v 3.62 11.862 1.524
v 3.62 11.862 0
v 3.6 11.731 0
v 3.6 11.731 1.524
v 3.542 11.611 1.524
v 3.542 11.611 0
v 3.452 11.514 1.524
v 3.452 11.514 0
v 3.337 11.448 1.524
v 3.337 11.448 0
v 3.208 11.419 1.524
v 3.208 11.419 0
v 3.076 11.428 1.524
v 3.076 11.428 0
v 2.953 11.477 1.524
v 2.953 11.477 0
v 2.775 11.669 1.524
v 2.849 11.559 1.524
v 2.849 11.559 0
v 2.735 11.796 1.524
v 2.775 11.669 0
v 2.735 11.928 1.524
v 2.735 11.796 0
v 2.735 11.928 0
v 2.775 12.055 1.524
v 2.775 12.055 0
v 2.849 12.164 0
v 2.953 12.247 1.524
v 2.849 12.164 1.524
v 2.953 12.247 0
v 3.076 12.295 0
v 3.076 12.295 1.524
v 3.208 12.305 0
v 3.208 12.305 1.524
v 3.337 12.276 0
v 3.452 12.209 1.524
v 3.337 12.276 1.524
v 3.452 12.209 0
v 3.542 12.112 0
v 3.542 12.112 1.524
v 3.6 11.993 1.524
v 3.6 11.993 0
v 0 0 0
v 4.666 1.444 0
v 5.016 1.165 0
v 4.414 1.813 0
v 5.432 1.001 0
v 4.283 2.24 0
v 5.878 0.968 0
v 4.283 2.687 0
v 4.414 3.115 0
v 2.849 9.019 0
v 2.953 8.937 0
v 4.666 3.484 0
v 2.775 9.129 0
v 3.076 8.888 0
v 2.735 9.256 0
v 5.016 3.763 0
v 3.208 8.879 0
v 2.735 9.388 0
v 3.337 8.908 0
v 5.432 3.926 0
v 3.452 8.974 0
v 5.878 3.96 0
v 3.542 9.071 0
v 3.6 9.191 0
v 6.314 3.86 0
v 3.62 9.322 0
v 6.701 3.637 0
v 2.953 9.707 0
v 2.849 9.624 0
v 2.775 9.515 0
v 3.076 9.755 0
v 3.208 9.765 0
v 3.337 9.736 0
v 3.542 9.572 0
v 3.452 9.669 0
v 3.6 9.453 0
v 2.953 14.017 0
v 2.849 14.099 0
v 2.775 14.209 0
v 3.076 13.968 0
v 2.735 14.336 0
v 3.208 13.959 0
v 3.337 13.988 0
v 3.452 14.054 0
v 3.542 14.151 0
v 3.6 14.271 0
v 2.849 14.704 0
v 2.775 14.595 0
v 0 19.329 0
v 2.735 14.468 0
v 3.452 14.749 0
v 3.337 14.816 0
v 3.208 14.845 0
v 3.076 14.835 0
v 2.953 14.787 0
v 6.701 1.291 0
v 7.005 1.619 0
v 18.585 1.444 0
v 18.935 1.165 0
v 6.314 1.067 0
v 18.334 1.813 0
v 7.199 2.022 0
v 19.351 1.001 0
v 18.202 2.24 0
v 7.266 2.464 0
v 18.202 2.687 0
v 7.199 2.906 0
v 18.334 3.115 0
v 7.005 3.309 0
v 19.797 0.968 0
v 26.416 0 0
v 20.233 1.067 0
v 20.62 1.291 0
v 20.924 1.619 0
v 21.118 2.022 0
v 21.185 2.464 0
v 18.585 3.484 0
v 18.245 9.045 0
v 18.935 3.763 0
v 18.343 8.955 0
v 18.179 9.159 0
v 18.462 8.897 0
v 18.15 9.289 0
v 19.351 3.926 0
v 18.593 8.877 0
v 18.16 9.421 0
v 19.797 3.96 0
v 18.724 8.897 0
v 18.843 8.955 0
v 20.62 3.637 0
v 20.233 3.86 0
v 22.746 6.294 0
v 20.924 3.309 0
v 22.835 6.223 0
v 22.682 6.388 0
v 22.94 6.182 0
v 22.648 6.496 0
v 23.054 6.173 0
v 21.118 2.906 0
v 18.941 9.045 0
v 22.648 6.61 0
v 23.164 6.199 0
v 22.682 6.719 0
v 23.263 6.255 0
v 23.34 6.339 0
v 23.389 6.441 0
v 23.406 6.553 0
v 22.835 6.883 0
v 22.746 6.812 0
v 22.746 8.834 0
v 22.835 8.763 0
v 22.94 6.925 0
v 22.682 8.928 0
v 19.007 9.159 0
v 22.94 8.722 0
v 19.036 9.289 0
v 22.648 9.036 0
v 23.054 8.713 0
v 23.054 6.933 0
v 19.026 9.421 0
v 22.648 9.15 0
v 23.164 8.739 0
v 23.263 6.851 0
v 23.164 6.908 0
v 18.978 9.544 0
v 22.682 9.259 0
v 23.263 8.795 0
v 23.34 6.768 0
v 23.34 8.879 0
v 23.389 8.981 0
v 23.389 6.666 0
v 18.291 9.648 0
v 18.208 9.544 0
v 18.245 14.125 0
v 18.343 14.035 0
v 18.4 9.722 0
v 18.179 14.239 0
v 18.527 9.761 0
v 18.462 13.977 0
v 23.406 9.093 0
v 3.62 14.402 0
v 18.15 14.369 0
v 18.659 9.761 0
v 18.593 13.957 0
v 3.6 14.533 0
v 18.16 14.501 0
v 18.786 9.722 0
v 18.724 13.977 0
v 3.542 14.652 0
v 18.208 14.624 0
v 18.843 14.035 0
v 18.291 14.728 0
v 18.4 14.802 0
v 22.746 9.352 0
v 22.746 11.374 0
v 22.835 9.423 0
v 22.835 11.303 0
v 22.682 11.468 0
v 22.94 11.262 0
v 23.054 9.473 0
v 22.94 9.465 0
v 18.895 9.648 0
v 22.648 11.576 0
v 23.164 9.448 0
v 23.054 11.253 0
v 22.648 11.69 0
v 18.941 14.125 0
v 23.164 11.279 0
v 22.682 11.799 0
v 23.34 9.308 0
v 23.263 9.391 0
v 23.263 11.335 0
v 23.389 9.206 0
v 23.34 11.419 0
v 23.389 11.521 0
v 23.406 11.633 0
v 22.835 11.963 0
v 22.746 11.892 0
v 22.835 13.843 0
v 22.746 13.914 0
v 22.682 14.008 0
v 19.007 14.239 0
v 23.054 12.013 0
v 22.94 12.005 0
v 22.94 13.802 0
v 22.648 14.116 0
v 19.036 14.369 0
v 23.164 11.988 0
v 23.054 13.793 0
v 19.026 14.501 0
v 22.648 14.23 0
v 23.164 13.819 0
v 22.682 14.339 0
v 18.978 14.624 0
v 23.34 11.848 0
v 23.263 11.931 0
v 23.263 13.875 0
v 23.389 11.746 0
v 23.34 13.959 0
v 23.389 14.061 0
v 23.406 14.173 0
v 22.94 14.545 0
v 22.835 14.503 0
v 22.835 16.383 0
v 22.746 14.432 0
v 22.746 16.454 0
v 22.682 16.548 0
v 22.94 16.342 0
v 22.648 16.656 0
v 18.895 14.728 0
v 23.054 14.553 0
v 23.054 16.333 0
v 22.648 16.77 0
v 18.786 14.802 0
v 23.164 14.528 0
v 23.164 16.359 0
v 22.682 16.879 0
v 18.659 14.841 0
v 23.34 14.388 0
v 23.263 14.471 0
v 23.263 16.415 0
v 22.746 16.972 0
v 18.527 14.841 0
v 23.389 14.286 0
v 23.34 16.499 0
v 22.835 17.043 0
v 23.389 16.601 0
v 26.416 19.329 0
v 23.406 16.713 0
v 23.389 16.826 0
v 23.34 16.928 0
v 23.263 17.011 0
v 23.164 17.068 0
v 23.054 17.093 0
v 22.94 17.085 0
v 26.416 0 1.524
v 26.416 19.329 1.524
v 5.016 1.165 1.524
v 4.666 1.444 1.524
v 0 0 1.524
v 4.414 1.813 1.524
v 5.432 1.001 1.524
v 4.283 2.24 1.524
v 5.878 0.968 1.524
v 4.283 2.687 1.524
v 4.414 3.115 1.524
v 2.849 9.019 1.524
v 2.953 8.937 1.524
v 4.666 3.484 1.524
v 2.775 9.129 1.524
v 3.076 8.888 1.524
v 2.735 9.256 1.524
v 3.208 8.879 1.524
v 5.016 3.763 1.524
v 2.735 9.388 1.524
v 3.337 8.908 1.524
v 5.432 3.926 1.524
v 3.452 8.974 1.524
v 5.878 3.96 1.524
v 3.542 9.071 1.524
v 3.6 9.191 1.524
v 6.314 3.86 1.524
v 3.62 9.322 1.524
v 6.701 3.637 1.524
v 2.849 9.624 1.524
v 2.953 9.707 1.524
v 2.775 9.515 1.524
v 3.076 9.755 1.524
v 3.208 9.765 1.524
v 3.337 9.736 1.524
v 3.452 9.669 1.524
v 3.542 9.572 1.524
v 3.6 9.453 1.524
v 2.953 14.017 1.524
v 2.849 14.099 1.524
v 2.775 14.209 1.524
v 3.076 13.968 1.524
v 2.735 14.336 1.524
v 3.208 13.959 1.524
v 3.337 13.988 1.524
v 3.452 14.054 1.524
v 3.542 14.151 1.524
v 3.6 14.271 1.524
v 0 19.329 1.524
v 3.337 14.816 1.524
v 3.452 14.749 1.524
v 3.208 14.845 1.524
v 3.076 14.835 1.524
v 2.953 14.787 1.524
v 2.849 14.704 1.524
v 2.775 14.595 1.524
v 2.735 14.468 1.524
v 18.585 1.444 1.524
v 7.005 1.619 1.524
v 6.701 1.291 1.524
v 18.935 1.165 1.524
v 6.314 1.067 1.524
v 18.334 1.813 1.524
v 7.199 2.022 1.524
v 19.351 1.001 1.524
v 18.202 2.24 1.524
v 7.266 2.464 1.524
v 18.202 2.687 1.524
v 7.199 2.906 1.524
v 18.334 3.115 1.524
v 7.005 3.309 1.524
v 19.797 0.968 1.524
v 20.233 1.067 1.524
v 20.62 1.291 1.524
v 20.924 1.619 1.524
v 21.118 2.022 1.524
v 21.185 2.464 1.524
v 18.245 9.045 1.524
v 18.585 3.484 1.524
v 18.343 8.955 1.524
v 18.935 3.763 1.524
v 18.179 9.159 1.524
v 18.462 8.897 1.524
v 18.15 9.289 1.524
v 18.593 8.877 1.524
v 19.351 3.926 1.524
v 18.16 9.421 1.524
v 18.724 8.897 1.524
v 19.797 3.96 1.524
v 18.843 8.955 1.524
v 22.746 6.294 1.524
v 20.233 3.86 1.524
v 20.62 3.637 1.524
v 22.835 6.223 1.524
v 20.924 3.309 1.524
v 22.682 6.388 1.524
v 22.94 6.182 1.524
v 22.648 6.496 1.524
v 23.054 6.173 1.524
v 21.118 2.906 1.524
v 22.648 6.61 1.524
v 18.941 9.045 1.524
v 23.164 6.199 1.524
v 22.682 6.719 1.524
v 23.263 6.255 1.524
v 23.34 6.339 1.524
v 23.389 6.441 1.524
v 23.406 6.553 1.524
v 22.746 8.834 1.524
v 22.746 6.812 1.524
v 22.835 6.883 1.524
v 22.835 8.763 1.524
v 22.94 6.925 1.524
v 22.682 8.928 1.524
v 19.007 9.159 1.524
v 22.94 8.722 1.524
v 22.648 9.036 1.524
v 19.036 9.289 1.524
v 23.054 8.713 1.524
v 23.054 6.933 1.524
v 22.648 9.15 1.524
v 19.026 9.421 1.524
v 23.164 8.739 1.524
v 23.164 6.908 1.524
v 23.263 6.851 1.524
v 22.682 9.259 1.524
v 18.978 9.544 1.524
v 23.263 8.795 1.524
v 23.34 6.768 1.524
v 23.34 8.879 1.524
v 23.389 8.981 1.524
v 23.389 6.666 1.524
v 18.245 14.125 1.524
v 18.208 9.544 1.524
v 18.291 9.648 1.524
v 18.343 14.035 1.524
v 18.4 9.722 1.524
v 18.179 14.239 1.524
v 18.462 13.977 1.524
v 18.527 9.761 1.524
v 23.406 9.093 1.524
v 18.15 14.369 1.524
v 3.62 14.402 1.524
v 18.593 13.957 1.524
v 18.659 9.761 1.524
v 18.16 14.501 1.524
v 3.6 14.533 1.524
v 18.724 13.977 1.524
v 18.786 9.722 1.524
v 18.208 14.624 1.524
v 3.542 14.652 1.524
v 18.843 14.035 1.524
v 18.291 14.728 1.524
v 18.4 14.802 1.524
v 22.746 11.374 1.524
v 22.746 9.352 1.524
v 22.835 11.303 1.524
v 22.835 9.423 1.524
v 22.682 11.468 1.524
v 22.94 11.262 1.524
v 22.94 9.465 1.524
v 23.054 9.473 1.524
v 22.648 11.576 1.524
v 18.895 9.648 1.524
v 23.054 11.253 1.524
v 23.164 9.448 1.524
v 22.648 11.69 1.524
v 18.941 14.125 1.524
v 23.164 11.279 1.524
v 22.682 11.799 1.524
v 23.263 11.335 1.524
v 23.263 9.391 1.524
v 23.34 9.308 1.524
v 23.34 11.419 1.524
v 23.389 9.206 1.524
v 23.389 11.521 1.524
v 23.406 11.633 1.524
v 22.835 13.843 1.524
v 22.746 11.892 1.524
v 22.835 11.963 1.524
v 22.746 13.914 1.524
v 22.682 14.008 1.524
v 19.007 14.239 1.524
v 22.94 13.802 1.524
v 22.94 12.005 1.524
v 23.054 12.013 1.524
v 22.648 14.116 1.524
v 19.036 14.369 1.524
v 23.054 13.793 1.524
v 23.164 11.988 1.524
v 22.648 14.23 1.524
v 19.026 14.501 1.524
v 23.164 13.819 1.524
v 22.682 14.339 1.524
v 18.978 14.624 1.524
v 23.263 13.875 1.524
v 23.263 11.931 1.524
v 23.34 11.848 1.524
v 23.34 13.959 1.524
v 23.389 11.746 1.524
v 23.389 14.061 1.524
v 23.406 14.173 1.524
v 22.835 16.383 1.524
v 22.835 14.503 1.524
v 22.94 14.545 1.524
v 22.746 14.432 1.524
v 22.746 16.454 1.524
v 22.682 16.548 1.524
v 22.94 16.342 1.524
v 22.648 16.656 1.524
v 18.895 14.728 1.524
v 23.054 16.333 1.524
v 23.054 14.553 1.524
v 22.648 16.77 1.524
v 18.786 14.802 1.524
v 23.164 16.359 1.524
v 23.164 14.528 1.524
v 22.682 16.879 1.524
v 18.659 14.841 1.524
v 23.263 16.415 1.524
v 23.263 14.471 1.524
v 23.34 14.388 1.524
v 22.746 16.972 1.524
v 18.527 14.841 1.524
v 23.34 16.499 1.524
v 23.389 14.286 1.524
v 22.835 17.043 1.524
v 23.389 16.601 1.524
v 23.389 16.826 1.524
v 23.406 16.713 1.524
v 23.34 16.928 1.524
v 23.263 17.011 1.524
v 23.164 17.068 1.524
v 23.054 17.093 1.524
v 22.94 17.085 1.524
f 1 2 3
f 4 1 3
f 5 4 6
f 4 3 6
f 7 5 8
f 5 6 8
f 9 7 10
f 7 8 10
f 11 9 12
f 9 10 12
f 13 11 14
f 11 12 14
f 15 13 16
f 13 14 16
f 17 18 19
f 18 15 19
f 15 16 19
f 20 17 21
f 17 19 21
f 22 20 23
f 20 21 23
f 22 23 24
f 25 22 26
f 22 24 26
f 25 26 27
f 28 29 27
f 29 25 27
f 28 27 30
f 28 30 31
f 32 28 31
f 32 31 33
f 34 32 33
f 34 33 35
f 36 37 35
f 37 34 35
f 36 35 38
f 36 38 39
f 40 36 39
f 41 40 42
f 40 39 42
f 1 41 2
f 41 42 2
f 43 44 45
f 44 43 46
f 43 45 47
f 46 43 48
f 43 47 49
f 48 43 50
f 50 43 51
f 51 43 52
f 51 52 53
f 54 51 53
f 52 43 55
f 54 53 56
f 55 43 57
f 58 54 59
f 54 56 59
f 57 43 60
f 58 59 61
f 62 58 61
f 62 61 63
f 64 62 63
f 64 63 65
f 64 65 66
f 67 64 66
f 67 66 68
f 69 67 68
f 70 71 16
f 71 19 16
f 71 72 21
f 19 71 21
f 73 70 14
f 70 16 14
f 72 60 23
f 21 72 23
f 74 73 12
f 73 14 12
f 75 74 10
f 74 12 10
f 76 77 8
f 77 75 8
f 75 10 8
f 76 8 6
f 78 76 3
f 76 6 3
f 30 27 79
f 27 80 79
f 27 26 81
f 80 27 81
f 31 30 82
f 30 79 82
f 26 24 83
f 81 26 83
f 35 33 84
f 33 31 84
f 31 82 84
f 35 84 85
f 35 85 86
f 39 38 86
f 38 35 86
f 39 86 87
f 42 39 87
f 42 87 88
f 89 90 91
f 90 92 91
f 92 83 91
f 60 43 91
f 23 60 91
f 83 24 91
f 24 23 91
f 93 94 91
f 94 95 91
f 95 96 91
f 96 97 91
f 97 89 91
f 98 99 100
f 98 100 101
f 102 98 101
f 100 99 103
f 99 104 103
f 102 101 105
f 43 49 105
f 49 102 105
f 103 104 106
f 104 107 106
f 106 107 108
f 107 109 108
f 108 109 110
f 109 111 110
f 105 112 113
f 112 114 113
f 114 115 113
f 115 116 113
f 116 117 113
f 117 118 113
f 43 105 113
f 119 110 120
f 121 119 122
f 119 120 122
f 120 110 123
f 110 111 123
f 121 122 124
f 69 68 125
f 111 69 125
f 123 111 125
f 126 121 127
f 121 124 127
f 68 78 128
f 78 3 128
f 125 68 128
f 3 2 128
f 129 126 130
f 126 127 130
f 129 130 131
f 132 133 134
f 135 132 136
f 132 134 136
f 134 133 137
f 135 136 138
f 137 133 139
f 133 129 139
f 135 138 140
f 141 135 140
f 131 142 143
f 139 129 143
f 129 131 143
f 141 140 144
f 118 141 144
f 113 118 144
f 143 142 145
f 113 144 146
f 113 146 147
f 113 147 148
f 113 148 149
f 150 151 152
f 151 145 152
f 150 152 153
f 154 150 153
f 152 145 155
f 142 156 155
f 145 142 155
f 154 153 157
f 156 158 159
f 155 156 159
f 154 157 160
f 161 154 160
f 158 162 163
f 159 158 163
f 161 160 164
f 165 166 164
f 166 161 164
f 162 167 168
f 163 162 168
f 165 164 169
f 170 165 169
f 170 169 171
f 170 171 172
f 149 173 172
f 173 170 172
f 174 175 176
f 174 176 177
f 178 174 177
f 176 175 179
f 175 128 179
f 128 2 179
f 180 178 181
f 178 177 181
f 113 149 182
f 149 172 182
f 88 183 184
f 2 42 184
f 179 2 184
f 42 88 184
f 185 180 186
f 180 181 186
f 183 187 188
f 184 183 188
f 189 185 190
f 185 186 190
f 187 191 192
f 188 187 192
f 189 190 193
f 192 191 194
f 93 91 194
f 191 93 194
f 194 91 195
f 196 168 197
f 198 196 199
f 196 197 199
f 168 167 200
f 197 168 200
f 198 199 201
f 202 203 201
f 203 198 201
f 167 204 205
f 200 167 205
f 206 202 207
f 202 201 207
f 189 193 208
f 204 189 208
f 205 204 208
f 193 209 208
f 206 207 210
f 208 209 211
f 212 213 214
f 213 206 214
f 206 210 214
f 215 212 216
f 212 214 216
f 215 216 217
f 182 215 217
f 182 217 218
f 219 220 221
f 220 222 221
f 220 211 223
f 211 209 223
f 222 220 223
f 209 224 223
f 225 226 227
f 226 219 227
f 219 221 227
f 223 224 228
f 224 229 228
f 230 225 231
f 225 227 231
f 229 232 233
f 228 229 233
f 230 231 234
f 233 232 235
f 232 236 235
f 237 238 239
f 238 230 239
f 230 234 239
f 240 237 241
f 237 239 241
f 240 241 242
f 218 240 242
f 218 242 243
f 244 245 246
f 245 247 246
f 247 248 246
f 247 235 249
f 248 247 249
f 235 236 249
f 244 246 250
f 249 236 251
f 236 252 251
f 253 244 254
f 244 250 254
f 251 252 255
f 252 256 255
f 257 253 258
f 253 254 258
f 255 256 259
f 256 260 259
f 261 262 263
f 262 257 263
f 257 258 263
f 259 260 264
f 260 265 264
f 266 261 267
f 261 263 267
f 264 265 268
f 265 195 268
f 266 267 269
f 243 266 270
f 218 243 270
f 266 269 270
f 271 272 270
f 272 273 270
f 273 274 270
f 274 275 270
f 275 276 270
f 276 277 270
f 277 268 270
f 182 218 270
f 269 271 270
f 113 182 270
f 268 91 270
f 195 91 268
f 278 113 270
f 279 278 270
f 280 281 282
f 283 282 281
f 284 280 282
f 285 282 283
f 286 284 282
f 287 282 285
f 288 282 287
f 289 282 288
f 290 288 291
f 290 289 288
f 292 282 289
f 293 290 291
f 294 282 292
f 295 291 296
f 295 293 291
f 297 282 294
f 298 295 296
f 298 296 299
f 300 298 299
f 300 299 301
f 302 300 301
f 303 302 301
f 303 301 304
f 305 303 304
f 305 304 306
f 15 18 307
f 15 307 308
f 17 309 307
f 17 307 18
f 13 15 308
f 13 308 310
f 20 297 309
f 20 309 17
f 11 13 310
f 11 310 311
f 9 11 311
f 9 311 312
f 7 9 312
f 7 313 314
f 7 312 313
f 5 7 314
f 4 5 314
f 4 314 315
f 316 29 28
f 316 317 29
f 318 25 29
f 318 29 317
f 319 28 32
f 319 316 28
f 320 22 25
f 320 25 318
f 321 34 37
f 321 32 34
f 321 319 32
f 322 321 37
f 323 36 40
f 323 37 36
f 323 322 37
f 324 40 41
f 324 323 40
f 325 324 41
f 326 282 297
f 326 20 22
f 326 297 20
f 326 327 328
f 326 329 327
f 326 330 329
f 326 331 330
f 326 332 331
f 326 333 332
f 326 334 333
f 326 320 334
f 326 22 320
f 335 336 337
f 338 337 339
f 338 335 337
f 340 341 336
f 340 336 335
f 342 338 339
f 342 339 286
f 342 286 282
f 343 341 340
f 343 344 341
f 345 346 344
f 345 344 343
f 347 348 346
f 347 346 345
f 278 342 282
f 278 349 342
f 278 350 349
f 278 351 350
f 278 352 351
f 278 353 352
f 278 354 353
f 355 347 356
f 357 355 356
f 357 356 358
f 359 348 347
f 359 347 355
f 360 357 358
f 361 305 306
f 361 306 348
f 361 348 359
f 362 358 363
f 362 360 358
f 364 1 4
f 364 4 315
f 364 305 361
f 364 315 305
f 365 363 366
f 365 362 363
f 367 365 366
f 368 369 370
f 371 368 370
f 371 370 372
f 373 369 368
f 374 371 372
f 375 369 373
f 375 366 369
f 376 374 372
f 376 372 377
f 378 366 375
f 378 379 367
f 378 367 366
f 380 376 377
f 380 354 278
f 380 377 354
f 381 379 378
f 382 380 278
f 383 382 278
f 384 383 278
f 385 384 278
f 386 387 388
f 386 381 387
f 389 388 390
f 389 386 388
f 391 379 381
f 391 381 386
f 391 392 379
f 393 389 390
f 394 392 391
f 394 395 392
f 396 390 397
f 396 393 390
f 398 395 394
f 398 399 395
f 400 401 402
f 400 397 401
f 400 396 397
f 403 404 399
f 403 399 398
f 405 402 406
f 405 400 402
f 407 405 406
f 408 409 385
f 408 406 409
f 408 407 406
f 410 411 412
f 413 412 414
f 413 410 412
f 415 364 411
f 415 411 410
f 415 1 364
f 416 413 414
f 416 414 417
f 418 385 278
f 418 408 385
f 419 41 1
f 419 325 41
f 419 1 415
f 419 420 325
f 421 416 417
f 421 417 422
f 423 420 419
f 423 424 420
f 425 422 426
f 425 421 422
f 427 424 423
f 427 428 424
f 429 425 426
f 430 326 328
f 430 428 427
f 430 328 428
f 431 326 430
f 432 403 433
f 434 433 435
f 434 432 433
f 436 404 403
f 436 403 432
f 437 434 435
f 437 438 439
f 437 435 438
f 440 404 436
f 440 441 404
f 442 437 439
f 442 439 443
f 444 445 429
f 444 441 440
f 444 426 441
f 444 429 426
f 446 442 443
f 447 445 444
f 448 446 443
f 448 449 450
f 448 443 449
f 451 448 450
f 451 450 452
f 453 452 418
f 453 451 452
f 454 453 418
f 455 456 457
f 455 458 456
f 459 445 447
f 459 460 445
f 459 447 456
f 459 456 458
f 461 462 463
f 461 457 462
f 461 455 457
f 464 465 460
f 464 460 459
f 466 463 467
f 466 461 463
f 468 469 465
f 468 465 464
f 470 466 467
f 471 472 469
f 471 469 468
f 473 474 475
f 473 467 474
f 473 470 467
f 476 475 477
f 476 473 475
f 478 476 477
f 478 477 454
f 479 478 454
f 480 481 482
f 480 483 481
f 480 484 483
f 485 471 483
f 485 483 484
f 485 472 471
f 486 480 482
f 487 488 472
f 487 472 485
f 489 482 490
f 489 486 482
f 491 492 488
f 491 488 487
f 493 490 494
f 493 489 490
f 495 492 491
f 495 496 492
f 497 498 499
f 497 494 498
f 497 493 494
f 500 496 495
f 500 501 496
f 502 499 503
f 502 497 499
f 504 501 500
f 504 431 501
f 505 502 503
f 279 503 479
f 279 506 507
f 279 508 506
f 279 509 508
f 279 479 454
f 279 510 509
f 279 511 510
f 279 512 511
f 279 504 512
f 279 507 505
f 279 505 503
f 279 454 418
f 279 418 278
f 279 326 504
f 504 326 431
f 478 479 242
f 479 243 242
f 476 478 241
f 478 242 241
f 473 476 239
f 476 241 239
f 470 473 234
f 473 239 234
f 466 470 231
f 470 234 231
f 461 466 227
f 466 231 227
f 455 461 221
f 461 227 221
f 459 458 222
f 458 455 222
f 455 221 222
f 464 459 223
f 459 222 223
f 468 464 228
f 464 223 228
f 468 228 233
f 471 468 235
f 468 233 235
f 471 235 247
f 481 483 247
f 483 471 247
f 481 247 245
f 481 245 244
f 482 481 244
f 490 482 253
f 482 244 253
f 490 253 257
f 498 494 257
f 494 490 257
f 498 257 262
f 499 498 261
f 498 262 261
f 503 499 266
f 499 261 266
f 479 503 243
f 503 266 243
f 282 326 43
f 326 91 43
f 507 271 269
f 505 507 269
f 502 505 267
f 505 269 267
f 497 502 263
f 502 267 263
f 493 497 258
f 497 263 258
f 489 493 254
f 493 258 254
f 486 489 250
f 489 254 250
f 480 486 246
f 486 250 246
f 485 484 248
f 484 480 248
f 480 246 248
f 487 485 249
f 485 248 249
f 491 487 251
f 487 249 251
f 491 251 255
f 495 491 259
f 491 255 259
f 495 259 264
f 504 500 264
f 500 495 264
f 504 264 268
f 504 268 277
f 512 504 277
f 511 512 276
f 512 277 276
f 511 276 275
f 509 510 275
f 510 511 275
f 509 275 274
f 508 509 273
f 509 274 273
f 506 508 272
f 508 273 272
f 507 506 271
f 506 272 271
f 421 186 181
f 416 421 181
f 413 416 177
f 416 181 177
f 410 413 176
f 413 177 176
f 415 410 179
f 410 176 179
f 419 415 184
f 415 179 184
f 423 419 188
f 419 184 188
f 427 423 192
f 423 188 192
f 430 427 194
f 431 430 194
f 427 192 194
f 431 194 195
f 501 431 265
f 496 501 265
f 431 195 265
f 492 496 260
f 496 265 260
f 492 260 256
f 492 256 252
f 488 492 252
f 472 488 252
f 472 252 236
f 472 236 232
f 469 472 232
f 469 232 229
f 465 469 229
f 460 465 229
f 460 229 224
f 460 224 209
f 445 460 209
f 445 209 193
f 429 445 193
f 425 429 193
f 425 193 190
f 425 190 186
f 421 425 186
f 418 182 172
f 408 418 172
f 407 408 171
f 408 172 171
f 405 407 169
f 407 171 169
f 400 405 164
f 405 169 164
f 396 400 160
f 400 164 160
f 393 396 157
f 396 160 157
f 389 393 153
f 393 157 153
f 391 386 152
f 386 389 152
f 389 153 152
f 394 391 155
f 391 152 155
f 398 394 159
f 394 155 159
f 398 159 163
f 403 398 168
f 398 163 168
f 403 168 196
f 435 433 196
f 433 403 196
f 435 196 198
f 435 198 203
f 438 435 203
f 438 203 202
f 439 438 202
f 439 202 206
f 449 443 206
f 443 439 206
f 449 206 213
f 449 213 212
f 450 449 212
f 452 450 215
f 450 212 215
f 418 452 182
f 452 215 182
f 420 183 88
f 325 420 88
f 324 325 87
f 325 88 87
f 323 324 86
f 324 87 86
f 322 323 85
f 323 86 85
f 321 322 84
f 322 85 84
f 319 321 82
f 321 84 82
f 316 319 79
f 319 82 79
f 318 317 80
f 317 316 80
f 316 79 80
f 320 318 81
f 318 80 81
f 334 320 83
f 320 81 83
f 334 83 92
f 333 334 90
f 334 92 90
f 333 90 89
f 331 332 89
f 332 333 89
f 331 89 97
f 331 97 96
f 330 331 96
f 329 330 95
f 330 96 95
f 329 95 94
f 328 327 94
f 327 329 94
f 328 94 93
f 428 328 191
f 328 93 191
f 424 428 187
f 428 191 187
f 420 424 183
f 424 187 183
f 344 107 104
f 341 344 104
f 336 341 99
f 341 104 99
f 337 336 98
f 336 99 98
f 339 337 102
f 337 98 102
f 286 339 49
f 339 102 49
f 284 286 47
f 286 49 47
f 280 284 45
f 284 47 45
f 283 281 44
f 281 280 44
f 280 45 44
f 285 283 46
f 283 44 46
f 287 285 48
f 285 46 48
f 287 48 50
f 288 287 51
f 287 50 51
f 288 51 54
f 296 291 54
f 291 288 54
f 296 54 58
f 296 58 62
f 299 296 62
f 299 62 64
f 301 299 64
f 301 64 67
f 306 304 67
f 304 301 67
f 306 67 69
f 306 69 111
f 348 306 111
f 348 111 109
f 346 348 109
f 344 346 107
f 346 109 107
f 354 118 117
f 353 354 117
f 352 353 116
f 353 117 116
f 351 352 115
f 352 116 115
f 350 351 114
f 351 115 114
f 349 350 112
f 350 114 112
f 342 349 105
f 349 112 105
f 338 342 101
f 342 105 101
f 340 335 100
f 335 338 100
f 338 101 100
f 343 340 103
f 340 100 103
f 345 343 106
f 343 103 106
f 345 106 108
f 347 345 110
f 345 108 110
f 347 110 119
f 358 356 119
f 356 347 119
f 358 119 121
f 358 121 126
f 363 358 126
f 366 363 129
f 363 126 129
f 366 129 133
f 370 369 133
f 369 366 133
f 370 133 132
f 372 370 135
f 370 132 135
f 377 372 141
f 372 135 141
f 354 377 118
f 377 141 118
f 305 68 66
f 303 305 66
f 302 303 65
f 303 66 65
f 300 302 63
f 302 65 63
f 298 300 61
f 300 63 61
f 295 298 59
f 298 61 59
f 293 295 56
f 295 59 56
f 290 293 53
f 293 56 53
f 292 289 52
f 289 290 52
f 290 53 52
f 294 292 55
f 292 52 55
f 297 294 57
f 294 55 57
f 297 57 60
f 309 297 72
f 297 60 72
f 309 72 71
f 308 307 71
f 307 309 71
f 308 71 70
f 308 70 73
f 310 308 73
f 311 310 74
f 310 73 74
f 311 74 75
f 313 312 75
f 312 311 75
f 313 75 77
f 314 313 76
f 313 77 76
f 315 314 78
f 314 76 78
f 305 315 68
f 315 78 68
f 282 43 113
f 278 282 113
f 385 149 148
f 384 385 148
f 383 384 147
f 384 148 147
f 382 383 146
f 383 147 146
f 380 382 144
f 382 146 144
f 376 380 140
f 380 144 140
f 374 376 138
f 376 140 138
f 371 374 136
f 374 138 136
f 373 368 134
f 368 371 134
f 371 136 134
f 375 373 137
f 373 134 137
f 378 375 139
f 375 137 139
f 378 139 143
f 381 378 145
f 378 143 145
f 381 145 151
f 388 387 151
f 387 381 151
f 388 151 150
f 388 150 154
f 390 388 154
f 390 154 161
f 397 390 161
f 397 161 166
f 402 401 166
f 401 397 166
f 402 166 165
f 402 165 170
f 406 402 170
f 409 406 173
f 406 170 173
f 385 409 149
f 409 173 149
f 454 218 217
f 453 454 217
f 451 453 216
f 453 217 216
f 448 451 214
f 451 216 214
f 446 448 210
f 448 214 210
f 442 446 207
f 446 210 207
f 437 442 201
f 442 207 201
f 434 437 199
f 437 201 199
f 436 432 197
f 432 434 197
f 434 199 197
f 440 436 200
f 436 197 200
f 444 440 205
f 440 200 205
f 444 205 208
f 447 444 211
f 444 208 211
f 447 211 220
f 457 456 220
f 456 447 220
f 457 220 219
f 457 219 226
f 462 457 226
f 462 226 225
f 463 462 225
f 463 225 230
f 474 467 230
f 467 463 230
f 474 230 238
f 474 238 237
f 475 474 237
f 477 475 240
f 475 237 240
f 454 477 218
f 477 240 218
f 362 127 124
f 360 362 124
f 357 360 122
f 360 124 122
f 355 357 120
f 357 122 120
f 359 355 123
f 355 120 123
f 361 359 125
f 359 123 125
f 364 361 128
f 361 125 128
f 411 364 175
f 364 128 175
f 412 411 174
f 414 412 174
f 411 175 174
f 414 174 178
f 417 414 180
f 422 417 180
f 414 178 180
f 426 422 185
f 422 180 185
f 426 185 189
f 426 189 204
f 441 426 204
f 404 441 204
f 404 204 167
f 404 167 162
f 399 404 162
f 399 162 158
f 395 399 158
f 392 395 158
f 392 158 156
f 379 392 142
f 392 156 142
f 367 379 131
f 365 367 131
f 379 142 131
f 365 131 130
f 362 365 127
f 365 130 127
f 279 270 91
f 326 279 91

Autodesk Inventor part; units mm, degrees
ref_plane "YZ Plane" through (0, 0, 0) normal (1, 0, 0) x (0, 1, 0)
ref_plane "XZ Plane" through (0, 0, 0) normal (0, 1, 0) x (-1, 0, 0)
ref_plane "XY Plane" through (0, 0, 0) normal (0, 0, 1) x (1, 0, 0)
sketch "Sketch1" plane through (0, 0, 0) normal (0, 0, 1) x (1, 0, 0)
  line L0 (0, 0) -> (26.416, 0)
  line L1 (26.416, 0) -> (26.416, 19.3294)
  line L2 (26.416, 19.3294) -> (0, 19.3294)
  line L3 (0, 19.3294) -> (0, 0)
  circle A0 centre (5.7658, 2.4638) radius 1.5
  circle A1 centre (19.685, 2.4638) radius 1.5
  line L4 (21.8186, 5.2832) -> (24.2316, 5.2832)
  line L5 (24.2316, 5.2832) -> (24.2316, 17.9832)
  line L6 (24.2316, 17.9832) -> (21.8186, 17.9832)
  line L7 (21.8186, 17.9832) -> (21.8186, 5.2832)
  circle A2 centre (23.0251, 6.5532) radius 0.381
  circle A3 centre (23.0251, 9.0932) radius 0.381
  circle A4 centre (23.0251, 11.6332) radius 0.381
  circle A5 centre (23.0251, 14.1732) radius 0.381
  circle A6 centre (23.0251, 16.7132) radius 0.381
  circle A7 centre (3.175, 14.4018) radius 0.4445
  circle A8 centre (3.175, 11.8618) radius 0.4445
  circle A9 centre (3.175, 9.3218) radius 0.4445
  circle A10 centre (18.593, 9.3218) radius 0.4445 projected
  dimension "d0" = 26.416
  dimension "d1" = 19.3294
  dimension "d2" = 3
  dimension "d3" = 3
  dimension "d4" = 5.7658
  dimension "d5" = 2.4638
  dimension "d6" = 13.9192
  dimension "d7" = 6.731
  dimension "d8" = 2.413
  dimension "d9" = 12.7
  dimension "d10" = 5.2832
  dimension "d11" = 2.1844
  dimension "d12" = 1.27
  dimension "d14" = 2.54
  dimension "d15" = 2.54
  dimension "d16" = 2.54
  dimension "d18" = 1.2065
  dimension "d19" = 2.54
  dimension "d20" = 0.762
  dimension "d21" = 0.762
  dimension "d22" = 0.762
  dimension "d23" = 0.762
  dimension "d24" = 0.762
  dimension "d25" = 0.889
  dimension "d26" = 0.889
  dimension "d27" = 0.889
  dimension "d28" = 4.9276
  dimension "d29" = 2.54
  dimension "d30" = 2.54
  dimension "d31" = 3.175
extrude "Extrusion1" add sketch "Sketch1" along normal blind 1.524 contours L3 L2 L1 L0 | L7 L6 L5 L4 | A10
sketch "Sketch3" plane through (0, 0, 1.524) normal (0, 0, 1) x (1, 0, 0)
  arc A0 (18.9807, 14.6193) -> (18.7439, 13.9837) centre (18.593, 14.4018) ccw projected
  circle A1 centre (18.593, 9.3218) radius 0.4445 projected
hole "Hole1" at (18.593, 14.4018, 1.524) at (18.593, 9.3218, 1.524) direction (0, 0, -1) diameter 0.889 end through all
equation "\"d18\" = 0.5 * d8"
equation "\"d26\" = d25"
equation "\"d27\" = d25"
properties part number "pcb"
